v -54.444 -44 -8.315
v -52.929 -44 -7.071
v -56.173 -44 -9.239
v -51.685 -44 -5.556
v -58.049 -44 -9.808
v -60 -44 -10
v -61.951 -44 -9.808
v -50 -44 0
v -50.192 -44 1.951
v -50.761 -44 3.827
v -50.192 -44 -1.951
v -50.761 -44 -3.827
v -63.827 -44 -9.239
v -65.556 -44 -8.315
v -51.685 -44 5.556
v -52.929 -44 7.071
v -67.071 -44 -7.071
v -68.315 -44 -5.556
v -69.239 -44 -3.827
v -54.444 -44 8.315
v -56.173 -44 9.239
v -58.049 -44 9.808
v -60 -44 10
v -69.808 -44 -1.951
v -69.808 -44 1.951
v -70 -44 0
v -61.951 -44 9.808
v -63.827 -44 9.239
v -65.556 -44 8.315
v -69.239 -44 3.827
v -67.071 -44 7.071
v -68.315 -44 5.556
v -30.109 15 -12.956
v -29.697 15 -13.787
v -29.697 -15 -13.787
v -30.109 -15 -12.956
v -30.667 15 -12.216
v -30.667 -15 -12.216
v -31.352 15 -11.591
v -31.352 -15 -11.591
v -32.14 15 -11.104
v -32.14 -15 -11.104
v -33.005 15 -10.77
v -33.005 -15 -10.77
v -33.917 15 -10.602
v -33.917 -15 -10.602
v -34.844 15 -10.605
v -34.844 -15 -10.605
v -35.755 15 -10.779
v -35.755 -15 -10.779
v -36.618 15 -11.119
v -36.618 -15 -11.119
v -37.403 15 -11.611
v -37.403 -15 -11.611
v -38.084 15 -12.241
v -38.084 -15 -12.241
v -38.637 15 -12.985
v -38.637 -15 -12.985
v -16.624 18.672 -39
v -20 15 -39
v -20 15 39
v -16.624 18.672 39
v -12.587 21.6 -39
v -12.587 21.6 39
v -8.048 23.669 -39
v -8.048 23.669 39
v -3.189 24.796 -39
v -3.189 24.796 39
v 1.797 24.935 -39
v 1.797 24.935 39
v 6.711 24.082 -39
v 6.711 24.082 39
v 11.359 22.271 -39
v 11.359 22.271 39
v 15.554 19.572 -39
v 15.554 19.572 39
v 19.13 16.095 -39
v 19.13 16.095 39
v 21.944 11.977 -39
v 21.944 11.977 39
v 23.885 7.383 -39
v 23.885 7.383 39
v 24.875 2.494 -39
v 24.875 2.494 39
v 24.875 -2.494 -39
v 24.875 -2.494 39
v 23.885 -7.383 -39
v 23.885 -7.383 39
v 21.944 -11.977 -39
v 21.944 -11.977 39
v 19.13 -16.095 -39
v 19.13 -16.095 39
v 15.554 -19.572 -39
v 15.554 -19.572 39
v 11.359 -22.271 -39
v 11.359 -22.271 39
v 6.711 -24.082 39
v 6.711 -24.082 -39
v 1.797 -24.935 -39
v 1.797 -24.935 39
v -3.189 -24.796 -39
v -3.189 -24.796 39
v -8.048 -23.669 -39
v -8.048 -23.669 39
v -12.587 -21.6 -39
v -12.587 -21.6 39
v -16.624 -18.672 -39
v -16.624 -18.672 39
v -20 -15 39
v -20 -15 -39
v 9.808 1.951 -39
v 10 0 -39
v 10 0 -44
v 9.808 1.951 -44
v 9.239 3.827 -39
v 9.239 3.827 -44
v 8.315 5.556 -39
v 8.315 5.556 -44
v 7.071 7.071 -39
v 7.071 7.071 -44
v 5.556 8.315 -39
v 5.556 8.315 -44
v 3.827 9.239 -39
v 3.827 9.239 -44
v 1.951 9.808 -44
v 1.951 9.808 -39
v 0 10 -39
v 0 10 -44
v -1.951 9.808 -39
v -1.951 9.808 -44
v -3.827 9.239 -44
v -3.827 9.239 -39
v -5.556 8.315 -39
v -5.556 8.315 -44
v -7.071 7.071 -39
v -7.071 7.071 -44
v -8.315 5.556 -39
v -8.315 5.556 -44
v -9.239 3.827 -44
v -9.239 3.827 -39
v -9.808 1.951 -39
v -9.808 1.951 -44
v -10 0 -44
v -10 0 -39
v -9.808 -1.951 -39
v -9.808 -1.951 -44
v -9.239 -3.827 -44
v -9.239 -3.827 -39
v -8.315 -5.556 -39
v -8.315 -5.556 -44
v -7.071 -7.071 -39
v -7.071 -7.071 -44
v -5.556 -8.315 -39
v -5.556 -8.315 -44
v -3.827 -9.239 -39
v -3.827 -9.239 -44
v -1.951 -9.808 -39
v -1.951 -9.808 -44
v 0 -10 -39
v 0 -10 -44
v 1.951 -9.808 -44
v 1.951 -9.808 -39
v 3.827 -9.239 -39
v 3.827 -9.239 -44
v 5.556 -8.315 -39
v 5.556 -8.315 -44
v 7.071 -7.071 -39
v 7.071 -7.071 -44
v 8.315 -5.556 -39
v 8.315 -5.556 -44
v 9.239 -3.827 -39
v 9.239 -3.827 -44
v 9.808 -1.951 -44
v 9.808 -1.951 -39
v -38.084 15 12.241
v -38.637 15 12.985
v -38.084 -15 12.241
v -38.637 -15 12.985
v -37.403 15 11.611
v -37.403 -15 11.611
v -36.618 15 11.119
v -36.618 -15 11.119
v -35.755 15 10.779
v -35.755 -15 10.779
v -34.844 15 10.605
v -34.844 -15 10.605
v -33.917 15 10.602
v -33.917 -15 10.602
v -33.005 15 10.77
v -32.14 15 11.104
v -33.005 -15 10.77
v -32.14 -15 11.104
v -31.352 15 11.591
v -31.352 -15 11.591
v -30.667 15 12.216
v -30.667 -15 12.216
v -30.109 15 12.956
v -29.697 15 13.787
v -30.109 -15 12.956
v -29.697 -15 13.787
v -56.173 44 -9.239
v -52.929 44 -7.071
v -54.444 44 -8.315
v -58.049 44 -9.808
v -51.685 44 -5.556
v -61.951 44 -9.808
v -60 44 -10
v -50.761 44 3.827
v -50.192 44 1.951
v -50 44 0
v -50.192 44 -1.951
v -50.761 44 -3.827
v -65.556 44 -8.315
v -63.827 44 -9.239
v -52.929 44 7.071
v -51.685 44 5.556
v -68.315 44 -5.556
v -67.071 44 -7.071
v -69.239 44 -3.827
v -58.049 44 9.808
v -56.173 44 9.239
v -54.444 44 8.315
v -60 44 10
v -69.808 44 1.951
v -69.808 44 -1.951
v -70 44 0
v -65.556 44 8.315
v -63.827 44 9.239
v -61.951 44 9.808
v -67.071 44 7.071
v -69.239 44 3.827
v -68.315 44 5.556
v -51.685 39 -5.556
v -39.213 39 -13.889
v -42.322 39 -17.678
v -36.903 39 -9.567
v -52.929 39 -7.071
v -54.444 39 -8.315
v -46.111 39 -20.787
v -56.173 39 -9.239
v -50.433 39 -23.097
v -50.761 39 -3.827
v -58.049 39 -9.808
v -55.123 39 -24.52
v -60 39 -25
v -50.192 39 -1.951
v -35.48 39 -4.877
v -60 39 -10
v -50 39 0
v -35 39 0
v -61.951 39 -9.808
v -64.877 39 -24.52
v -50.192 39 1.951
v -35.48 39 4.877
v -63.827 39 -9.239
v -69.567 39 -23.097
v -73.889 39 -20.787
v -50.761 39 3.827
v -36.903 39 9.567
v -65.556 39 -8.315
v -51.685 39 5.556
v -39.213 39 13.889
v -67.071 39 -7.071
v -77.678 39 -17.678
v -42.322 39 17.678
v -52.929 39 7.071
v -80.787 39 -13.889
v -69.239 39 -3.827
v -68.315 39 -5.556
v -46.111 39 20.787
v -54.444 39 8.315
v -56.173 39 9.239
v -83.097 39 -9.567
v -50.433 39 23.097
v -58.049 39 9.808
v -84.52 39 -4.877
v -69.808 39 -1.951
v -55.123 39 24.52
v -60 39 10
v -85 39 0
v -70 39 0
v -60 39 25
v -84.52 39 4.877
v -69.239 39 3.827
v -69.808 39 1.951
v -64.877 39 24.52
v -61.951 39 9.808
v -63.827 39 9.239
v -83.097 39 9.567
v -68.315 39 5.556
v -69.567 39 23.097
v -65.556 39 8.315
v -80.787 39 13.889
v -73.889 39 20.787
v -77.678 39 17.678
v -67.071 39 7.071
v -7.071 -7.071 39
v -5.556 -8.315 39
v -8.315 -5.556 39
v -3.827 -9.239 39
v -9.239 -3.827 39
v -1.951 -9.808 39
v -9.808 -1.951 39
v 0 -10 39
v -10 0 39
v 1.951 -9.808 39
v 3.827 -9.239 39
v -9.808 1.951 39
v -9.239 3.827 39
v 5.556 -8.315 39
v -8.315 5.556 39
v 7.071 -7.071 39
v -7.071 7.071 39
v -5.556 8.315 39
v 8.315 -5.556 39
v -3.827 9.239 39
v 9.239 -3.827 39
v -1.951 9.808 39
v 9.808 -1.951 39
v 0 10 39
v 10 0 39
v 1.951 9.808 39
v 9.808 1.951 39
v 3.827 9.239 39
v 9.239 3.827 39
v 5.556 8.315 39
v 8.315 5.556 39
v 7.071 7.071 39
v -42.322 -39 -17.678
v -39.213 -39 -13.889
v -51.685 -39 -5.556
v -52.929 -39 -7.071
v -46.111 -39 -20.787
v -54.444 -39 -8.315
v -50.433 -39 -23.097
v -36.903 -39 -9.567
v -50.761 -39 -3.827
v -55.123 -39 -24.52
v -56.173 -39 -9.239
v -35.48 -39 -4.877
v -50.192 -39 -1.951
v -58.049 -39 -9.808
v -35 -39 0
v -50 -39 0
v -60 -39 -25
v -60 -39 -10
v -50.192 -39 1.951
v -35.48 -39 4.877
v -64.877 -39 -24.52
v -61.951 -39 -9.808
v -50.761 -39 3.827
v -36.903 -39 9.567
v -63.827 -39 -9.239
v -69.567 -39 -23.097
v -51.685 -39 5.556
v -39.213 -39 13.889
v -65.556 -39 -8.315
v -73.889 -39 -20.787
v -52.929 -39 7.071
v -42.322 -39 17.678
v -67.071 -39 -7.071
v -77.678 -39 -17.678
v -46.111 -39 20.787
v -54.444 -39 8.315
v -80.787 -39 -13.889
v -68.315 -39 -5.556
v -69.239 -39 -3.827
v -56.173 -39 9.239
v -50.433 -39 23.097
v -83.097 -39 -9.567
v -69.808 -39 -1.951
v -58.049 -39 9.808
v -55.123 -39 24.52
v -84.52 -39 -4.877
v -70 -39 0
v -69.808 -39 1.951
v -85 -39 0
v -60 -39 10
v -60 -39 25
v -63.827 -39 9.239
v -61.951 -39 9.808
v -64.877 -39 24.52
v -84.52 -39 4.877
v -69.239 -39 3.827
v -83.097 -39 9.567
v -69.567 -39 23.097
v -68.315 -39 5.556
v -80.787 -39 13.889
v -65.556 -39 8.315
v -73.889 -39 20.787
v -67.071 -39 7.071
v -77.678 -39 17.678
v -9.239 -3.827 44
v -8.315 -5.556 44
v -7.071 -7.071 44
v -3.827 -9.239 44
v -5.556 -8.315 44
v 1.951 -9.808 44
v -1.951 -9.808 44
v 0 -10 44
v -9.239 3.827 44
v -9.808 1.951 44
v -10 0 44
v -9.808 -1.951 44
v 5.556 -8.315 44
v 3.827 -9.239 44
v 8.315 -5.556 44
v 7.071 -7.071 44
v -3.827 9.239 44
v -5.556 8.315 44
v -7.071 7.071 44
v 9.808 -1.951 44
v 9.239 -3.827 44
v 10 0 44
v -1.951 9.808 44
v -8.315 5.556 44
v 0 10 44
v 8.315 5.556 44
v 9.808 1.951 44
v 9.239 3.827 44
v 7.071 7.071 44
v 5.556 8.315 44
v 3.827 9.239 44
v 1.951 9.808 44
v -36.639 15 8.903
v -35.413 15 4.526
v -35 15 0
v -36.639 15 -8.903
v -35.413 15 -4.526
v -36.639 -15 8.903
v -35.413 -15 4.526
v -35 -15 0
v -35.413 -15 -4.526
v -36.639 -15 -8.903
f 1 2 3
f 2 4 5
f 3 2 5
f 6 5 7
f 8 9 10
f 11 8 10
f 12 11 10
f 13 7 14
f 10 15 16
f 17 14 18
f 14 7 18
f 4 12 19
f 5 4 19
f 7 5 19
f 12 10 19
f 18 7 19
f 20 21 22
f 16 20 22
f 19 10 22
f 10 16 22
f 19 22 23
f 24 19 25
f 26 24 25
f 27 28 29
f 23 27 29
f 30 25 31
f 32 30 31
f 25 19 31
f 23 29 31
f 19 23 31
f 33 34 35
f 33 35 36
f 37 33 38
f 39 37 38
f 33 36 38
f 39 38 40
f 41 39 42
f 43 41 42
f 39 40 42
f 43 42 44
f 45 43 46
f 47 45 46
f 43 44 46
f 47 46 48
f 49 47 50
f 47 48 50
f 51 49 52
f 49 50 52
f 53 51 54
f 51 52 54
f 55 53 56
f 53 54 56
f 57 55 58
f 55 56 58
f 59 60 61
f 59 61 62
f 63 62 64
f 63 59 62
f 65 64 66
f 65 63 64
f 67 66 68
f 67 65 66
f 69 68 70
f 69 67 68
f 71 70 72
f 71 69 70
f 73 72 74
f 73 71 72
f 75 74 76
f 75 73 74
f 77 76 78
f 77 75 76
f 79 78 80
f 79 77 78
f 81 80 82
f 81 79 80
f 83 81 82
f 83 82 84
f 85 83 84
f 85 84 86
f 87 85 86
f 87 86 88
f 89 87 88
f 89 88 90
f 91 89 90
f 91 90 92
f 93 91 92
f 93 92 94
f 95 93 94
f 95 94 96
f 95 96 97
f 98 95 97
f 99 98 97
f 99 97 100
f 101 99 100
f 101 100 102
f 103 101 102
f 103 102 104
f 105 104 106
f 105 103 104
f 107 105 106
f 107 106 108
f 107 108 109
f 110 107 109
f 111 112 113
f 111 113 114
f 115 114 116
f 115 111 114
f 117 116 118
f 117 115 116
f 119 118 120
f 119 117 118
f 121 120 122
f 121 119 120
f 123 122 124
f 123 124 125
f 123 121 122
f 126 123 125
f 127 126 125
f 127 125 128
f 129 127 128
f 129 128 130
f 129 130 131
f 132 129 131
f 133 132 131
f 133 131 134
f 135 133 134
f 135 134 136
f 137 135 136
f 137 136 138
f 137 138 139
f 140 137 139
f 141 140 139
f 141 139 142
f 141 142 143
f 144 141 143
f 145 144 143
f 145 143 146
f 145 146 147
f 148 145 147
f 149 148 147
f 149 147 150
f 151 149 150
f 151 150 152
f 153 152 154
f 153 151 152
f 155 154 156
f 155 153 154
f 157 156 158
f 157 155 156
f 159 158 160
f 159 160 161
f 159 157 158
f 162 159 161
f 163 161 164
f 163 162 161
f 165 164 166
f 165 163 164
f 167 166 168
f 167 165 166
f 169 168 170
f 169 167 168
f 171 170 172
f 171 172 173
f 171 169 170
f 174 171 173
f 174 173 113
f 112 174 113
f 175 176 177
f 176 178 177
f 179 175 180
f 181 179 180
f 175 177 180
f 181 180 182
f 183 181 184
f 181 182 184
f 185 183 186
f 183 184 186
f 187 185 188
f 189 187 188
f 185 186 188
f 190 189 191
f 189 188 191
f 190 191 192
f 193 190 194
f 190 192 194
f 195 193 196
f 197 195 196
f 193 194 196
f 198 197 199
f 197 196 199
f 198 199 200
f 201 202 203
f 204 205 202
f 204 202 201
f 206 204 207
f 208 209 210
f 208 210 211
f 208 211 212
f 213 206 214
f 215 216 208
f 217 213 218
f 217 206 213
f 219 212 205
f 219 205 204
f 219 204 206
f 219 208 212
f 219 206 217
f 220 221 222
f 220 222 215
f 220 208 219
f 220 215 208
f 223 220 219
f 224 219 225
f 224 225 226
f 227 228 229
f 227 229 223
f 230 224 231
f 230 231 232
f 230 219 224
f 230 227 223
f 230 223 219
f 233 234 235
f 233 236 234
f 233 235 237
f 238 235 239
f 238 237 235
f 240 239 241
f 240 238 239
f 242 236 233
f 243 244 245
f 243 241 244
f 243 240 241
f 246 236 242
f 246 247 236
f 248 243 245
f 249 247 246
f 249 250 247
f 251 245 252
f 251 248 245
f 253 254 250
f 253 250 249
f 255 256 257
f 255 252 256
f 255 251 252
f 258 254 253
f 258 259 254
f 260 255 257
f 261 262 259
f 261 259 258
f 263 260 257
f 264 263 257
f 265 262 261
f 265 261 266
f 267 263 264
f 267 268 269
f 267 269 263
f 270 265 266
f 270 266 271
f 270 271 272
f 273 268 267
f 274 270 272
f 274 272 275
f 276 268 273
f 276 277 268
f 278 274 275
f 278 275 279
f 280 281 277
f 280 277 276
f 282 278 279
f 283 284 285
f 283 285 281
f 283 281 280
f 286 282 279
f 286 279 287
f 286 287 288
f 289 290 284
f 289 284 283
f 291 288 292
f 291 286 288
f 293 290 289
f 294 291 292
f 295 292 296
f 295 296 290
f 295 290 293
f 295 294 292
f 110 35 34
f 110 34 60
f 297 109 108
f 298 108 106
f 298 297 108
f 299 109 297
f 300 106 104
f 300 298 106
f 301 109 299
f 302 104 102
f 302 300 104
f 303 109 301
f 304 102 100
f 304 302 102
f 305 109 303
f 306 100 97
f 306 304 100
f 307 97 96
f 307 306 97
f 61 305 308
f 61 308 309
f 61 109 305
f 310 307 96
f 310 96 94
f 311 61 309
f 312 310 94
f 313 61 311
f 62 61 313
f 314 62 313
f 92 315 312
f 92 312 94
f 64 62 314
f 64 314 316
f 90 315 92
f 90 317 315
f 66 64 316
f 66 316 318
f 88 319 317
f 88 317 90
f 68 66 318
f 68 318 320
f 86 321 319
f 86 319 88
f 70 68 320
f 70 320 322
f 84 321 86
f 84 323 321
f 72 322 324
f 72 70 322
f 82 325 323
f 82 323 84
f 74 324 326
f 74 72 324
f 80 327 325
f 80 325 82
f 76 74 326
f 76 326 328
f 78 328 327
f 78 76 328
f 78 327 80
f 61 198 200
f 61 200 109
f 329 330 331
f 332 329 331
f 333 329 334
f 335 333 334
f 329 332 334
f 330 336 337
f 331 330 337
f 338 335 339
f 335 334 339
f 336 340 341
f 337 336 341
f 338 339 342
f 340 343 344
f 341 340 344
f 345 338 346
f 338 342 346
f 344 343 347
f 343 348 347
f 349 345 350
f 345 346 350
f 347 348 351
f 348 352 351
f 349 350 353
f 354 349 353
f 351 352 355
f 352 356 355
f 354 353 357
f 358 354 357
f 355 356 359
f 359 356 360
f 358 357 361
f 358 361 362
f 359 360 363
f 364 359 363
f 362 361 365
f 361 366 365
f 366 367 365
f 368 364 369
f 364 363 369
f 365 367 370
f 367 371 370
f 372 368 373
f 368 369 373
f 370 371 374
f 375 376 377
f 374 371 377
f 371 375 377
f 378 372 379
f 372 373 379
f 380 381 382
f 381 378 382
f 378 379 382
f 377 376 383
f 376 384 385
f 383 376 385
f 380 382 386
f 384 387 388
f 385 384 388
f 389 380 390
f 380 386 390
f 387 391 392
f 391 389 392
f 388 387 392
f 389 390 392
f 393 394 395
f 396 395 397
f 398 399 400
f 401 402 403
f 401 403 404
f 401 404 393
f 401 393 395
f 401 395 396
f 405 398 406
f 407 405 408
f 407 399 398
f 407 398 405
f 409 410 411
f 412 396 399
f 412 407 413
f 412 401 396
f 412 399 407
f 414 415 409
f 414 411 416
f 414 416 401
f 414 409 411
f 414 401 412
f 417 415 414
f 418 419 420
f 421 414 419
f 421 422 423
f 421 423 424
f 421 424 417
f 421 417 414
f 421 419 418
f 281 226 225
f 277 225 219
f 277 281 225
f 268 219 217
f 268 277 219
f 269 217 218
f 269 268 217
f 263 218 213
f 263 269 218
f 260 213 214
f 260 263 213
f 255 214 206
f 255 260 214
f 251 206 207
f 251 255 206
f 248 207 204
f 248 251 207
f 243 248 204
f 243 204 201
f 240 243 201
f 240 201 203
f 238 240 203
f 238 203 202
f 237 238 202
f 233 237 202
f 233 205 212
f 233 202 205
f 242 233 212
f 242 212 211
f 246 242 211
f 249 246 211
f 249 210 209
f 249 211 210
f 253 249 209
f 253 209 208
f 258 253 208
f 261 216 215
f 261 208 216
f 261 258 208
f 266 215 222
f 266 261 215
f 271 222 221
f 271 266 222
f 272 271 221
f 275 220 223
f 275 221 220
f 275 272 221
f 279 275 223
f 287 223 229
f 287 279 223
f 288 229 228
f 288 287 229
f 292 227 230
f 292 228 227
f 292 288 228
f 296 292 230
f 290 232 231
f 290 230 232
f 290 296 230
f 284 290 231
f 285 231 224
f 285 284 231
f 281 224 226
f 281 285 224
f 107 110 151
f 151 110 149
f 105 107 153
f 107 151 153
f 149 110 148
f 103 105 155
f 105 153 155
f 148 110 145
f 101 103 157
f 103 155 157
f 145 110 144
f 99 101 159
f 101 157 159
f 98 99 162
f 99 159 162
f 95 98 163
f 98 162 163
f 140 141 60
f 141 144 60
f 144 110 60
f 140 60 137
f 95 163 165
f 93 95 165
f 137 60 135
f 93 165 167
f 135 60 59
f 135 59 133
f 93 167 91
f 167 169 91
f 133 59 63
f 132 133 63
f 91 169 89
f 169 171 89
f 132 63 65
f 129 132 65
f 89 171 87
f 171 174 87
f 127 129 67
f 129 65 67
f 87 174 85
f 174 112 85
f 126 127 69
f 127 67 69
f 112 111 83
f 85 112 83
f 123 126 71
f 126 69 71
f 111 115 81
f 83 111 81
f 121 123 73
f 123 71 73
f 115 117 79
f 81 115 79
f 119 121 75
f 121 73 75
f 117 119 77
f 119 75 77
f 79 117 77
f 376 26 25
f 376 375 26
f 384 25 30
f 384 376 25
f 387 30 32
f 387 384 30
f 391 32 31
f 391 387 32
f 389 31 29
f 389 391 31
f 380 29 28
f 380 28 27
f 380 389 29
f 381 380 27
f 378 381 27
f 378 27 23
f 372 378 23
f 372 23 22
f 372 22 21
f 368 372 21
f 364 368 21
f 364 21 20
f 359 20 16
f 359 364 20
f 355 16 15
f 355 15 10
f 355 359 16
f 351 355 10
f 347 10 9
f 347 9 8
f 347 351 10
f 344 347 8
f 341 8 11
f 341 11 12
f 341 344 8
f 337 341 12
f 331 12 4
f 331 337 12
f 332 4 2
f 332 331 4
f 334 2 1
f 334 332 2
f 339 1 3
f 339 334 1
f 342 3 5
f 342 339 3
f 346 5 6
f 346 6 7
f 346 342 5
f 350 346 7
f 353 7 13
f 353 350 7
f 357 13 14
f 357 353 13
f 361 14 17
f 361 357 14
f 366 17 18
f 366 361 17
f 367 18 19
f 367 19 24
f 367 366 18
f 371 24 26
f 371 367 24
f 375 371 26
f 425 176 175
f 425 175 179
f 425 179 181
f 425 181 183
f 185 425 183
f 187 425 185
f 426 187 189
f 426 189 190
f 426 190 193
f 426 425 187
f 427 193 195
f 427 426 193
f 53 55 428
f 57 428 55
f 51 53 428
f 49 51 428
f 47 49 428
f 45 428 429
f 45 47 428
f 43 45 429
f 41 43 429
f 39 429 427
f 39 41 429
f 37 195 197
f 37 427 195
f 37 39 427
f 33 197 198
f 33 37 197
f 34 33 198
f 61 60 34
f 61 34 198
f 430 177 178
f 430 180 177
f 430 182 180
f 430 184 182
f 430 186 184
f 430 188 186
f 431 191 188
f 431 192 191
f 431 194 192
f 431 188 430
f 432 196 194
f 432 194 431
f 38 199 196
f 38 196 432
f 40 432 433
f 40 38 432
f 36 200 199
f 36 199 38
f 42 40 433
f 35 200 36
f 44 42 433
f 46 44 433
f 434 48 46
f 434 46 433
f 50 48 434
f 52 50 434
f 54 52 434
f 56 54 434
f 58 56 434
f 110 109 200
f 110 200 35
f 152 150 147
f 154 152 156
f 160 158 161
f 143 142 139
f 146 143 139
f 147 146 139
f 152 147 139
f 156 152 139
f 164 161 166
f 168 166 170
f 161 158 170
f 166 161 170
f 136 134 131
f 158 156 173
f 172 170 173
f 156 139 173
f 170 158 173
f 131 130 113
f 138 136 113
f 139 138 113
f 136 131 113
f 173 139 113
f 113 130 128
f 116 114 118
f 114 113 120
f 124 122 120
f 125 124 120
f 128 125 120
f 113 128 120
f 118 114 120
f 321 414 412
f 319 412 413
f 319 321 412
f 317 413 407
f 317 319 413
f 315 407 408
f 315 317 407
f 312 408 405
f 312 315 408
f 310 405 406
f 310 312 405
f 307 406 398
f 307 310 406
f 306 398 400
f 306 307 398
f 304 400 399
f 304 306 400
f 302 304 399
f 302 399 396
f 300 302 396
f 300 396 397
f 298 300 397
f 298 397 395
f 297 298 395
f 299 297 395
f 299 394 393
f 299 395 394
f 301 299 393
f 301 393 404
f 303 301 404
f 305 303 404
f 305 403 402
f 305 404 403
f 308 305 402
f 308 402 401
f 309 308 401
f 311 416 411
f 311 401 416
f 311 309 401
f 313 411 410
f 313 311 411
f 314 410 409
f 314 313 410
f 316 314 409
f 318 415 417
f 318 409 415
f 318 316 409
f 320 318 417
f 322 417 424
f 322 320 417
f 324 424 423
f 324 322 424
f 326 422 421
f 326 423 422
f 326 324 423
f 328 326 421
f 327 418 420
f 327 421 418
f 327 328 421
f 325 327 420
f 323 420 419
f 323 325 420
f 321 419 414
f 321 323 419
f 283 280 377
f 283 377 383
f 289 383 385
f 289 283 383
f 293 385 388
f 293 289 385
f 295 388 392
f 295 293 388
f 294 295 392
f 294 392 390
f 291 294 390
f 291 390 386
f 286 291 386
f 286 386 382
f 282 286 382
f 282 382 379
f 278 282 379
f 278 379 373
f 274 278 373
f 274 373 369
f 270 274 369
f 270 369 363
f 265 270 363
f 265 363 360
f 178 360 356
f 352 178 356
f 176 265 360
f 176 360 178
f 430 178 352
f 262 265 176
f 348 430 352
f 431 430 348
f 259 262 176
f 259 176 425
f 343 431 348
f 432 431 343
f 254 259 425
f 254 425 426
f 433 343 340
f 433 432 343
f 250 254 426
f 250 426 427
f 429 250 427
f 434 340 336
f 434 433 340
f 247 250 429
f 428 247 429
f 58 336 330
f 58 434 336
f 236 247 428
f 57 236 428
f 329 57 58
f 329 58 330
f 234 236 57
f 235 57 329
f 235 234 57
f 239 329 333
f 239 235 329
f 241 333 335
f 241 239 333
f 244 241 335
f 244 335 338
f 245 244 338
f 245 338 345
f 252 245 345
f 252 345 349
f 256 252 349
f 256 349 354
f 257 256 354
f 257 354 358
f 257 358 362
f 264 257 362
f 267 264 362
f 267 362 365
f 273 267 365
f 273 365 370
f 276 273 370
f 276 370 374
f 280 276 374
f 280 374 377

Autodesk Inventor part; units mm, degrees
ref_plane "YZ Plane" through (0, 0, 0) normal (1, 0, 0) x (0, 1, 0)
ref_plane "XZ Plane" through (0, 0, 0) normal (0, 1, 0) x (-1, 0, 0)
ref_plane "XY Plane" through (0, 0, 0) normal (0, 0, 1) x (1, 0, 0)
sketch "Sketch1" plane through (0, 0, 0) normal (0, 0, 1) x (1, 0, 0)
  circle A0 centre (0, 0) radius 25
  circle A1 centre (0, 0) radius 10
  line L0 (-60, 15) -> (-20, 15)
  line L1 (-20, 15) -> (-20, -15)
  line L2 (-20, -15) -> (-60, -15)
  line L3 (-60, -15) -> (-60, 15)
  point P0 (-40, -15)
  point P1 (-20, -15)
  dimension "d0" = 50
  dimension "d1" = 20
  dimension "d2" = 30
  dimension "d3" = 15
  dimension "d4" = 40
extrude "Extrusion1" add sketch "Sketch1" along normal mid plane 78 contours A0 L1 | L1 A0 | A0 L2 L3 L0 | A1
sketch "Sketch2" plane through (0, 0, 0) normal (0, 0, 1) x (1, 0, 0)
  circle A0 centre (0, 0) radius 10
  dimension "d7" = 20
extrude "Extrusion2" add sketch "Sketch2" along normal mid plane 88
sketch "Sketch3" plane through (0, 0, 0) normal (0, 1, 0) x (-1, 0, 0)
  circle A0 centre (60, 0) radius 25
  line L0 (20, -39) -> (20, 39) construction
  line L1 (60, 39) -> (60, -39) projected
  line L2 (-25, -39) -> (20, -39) projected
  line L3 (20, 39) -> (-25, 39) projected
  line L4 (0, 0) -> (60, 0) construction
  line L5 (35, 0) -> (20, -39)
  line L6 (35, 0) -> (20, 39)
  arc A1 (38.6367, -12.9849) -> (29.6973, -13.787) centre (34.364, -15.5819) ccw
  arc A2 (29.6973, 13.787) -> (38.6367, 12.9849) centre (34.364, 15.5819) ccw
  line L7 (60, 39) -> (20, 39) projected
  line L8 (60, 25) -> (60, 39)
  line L9 (60, -39) -> (60, -25)
  line L10 (20, -39) -> (20, 39) projected
  line L11 (20, -39) -> (60, -39)
  dimension "d10" = 50
  dimension "d11" = 60
  dimension "d14" = 10
  dimension "d15" = 10
extrude "Extrusion3" add sketch "Sketch3" along normal mid plane 78 contours A0 L1 | L1 A0
extrude "Extrusion4" cut sketch "Sketch3" along normal through all both and the other way through all contours A0 A2 L6 L7 L1 | L1 L11 L5 A1 A0
sketch "Sketch4" plane through (0, 0, 0) normal (0, 1, 0) x (-1, 0, 0)
  circle A0 centre (60, 0) radius 25 projected
  circle A1 centre (60, 0) radius 10
  point P0 (0, 0)
  dimension "d20" = 20
extrude "Extrusion5" add sketch "Sketch4" along normal mid plane 88 contours A1
equation "\"d3\" = 0.5 * d2"
properties part number "Arm 4 v0.1"
